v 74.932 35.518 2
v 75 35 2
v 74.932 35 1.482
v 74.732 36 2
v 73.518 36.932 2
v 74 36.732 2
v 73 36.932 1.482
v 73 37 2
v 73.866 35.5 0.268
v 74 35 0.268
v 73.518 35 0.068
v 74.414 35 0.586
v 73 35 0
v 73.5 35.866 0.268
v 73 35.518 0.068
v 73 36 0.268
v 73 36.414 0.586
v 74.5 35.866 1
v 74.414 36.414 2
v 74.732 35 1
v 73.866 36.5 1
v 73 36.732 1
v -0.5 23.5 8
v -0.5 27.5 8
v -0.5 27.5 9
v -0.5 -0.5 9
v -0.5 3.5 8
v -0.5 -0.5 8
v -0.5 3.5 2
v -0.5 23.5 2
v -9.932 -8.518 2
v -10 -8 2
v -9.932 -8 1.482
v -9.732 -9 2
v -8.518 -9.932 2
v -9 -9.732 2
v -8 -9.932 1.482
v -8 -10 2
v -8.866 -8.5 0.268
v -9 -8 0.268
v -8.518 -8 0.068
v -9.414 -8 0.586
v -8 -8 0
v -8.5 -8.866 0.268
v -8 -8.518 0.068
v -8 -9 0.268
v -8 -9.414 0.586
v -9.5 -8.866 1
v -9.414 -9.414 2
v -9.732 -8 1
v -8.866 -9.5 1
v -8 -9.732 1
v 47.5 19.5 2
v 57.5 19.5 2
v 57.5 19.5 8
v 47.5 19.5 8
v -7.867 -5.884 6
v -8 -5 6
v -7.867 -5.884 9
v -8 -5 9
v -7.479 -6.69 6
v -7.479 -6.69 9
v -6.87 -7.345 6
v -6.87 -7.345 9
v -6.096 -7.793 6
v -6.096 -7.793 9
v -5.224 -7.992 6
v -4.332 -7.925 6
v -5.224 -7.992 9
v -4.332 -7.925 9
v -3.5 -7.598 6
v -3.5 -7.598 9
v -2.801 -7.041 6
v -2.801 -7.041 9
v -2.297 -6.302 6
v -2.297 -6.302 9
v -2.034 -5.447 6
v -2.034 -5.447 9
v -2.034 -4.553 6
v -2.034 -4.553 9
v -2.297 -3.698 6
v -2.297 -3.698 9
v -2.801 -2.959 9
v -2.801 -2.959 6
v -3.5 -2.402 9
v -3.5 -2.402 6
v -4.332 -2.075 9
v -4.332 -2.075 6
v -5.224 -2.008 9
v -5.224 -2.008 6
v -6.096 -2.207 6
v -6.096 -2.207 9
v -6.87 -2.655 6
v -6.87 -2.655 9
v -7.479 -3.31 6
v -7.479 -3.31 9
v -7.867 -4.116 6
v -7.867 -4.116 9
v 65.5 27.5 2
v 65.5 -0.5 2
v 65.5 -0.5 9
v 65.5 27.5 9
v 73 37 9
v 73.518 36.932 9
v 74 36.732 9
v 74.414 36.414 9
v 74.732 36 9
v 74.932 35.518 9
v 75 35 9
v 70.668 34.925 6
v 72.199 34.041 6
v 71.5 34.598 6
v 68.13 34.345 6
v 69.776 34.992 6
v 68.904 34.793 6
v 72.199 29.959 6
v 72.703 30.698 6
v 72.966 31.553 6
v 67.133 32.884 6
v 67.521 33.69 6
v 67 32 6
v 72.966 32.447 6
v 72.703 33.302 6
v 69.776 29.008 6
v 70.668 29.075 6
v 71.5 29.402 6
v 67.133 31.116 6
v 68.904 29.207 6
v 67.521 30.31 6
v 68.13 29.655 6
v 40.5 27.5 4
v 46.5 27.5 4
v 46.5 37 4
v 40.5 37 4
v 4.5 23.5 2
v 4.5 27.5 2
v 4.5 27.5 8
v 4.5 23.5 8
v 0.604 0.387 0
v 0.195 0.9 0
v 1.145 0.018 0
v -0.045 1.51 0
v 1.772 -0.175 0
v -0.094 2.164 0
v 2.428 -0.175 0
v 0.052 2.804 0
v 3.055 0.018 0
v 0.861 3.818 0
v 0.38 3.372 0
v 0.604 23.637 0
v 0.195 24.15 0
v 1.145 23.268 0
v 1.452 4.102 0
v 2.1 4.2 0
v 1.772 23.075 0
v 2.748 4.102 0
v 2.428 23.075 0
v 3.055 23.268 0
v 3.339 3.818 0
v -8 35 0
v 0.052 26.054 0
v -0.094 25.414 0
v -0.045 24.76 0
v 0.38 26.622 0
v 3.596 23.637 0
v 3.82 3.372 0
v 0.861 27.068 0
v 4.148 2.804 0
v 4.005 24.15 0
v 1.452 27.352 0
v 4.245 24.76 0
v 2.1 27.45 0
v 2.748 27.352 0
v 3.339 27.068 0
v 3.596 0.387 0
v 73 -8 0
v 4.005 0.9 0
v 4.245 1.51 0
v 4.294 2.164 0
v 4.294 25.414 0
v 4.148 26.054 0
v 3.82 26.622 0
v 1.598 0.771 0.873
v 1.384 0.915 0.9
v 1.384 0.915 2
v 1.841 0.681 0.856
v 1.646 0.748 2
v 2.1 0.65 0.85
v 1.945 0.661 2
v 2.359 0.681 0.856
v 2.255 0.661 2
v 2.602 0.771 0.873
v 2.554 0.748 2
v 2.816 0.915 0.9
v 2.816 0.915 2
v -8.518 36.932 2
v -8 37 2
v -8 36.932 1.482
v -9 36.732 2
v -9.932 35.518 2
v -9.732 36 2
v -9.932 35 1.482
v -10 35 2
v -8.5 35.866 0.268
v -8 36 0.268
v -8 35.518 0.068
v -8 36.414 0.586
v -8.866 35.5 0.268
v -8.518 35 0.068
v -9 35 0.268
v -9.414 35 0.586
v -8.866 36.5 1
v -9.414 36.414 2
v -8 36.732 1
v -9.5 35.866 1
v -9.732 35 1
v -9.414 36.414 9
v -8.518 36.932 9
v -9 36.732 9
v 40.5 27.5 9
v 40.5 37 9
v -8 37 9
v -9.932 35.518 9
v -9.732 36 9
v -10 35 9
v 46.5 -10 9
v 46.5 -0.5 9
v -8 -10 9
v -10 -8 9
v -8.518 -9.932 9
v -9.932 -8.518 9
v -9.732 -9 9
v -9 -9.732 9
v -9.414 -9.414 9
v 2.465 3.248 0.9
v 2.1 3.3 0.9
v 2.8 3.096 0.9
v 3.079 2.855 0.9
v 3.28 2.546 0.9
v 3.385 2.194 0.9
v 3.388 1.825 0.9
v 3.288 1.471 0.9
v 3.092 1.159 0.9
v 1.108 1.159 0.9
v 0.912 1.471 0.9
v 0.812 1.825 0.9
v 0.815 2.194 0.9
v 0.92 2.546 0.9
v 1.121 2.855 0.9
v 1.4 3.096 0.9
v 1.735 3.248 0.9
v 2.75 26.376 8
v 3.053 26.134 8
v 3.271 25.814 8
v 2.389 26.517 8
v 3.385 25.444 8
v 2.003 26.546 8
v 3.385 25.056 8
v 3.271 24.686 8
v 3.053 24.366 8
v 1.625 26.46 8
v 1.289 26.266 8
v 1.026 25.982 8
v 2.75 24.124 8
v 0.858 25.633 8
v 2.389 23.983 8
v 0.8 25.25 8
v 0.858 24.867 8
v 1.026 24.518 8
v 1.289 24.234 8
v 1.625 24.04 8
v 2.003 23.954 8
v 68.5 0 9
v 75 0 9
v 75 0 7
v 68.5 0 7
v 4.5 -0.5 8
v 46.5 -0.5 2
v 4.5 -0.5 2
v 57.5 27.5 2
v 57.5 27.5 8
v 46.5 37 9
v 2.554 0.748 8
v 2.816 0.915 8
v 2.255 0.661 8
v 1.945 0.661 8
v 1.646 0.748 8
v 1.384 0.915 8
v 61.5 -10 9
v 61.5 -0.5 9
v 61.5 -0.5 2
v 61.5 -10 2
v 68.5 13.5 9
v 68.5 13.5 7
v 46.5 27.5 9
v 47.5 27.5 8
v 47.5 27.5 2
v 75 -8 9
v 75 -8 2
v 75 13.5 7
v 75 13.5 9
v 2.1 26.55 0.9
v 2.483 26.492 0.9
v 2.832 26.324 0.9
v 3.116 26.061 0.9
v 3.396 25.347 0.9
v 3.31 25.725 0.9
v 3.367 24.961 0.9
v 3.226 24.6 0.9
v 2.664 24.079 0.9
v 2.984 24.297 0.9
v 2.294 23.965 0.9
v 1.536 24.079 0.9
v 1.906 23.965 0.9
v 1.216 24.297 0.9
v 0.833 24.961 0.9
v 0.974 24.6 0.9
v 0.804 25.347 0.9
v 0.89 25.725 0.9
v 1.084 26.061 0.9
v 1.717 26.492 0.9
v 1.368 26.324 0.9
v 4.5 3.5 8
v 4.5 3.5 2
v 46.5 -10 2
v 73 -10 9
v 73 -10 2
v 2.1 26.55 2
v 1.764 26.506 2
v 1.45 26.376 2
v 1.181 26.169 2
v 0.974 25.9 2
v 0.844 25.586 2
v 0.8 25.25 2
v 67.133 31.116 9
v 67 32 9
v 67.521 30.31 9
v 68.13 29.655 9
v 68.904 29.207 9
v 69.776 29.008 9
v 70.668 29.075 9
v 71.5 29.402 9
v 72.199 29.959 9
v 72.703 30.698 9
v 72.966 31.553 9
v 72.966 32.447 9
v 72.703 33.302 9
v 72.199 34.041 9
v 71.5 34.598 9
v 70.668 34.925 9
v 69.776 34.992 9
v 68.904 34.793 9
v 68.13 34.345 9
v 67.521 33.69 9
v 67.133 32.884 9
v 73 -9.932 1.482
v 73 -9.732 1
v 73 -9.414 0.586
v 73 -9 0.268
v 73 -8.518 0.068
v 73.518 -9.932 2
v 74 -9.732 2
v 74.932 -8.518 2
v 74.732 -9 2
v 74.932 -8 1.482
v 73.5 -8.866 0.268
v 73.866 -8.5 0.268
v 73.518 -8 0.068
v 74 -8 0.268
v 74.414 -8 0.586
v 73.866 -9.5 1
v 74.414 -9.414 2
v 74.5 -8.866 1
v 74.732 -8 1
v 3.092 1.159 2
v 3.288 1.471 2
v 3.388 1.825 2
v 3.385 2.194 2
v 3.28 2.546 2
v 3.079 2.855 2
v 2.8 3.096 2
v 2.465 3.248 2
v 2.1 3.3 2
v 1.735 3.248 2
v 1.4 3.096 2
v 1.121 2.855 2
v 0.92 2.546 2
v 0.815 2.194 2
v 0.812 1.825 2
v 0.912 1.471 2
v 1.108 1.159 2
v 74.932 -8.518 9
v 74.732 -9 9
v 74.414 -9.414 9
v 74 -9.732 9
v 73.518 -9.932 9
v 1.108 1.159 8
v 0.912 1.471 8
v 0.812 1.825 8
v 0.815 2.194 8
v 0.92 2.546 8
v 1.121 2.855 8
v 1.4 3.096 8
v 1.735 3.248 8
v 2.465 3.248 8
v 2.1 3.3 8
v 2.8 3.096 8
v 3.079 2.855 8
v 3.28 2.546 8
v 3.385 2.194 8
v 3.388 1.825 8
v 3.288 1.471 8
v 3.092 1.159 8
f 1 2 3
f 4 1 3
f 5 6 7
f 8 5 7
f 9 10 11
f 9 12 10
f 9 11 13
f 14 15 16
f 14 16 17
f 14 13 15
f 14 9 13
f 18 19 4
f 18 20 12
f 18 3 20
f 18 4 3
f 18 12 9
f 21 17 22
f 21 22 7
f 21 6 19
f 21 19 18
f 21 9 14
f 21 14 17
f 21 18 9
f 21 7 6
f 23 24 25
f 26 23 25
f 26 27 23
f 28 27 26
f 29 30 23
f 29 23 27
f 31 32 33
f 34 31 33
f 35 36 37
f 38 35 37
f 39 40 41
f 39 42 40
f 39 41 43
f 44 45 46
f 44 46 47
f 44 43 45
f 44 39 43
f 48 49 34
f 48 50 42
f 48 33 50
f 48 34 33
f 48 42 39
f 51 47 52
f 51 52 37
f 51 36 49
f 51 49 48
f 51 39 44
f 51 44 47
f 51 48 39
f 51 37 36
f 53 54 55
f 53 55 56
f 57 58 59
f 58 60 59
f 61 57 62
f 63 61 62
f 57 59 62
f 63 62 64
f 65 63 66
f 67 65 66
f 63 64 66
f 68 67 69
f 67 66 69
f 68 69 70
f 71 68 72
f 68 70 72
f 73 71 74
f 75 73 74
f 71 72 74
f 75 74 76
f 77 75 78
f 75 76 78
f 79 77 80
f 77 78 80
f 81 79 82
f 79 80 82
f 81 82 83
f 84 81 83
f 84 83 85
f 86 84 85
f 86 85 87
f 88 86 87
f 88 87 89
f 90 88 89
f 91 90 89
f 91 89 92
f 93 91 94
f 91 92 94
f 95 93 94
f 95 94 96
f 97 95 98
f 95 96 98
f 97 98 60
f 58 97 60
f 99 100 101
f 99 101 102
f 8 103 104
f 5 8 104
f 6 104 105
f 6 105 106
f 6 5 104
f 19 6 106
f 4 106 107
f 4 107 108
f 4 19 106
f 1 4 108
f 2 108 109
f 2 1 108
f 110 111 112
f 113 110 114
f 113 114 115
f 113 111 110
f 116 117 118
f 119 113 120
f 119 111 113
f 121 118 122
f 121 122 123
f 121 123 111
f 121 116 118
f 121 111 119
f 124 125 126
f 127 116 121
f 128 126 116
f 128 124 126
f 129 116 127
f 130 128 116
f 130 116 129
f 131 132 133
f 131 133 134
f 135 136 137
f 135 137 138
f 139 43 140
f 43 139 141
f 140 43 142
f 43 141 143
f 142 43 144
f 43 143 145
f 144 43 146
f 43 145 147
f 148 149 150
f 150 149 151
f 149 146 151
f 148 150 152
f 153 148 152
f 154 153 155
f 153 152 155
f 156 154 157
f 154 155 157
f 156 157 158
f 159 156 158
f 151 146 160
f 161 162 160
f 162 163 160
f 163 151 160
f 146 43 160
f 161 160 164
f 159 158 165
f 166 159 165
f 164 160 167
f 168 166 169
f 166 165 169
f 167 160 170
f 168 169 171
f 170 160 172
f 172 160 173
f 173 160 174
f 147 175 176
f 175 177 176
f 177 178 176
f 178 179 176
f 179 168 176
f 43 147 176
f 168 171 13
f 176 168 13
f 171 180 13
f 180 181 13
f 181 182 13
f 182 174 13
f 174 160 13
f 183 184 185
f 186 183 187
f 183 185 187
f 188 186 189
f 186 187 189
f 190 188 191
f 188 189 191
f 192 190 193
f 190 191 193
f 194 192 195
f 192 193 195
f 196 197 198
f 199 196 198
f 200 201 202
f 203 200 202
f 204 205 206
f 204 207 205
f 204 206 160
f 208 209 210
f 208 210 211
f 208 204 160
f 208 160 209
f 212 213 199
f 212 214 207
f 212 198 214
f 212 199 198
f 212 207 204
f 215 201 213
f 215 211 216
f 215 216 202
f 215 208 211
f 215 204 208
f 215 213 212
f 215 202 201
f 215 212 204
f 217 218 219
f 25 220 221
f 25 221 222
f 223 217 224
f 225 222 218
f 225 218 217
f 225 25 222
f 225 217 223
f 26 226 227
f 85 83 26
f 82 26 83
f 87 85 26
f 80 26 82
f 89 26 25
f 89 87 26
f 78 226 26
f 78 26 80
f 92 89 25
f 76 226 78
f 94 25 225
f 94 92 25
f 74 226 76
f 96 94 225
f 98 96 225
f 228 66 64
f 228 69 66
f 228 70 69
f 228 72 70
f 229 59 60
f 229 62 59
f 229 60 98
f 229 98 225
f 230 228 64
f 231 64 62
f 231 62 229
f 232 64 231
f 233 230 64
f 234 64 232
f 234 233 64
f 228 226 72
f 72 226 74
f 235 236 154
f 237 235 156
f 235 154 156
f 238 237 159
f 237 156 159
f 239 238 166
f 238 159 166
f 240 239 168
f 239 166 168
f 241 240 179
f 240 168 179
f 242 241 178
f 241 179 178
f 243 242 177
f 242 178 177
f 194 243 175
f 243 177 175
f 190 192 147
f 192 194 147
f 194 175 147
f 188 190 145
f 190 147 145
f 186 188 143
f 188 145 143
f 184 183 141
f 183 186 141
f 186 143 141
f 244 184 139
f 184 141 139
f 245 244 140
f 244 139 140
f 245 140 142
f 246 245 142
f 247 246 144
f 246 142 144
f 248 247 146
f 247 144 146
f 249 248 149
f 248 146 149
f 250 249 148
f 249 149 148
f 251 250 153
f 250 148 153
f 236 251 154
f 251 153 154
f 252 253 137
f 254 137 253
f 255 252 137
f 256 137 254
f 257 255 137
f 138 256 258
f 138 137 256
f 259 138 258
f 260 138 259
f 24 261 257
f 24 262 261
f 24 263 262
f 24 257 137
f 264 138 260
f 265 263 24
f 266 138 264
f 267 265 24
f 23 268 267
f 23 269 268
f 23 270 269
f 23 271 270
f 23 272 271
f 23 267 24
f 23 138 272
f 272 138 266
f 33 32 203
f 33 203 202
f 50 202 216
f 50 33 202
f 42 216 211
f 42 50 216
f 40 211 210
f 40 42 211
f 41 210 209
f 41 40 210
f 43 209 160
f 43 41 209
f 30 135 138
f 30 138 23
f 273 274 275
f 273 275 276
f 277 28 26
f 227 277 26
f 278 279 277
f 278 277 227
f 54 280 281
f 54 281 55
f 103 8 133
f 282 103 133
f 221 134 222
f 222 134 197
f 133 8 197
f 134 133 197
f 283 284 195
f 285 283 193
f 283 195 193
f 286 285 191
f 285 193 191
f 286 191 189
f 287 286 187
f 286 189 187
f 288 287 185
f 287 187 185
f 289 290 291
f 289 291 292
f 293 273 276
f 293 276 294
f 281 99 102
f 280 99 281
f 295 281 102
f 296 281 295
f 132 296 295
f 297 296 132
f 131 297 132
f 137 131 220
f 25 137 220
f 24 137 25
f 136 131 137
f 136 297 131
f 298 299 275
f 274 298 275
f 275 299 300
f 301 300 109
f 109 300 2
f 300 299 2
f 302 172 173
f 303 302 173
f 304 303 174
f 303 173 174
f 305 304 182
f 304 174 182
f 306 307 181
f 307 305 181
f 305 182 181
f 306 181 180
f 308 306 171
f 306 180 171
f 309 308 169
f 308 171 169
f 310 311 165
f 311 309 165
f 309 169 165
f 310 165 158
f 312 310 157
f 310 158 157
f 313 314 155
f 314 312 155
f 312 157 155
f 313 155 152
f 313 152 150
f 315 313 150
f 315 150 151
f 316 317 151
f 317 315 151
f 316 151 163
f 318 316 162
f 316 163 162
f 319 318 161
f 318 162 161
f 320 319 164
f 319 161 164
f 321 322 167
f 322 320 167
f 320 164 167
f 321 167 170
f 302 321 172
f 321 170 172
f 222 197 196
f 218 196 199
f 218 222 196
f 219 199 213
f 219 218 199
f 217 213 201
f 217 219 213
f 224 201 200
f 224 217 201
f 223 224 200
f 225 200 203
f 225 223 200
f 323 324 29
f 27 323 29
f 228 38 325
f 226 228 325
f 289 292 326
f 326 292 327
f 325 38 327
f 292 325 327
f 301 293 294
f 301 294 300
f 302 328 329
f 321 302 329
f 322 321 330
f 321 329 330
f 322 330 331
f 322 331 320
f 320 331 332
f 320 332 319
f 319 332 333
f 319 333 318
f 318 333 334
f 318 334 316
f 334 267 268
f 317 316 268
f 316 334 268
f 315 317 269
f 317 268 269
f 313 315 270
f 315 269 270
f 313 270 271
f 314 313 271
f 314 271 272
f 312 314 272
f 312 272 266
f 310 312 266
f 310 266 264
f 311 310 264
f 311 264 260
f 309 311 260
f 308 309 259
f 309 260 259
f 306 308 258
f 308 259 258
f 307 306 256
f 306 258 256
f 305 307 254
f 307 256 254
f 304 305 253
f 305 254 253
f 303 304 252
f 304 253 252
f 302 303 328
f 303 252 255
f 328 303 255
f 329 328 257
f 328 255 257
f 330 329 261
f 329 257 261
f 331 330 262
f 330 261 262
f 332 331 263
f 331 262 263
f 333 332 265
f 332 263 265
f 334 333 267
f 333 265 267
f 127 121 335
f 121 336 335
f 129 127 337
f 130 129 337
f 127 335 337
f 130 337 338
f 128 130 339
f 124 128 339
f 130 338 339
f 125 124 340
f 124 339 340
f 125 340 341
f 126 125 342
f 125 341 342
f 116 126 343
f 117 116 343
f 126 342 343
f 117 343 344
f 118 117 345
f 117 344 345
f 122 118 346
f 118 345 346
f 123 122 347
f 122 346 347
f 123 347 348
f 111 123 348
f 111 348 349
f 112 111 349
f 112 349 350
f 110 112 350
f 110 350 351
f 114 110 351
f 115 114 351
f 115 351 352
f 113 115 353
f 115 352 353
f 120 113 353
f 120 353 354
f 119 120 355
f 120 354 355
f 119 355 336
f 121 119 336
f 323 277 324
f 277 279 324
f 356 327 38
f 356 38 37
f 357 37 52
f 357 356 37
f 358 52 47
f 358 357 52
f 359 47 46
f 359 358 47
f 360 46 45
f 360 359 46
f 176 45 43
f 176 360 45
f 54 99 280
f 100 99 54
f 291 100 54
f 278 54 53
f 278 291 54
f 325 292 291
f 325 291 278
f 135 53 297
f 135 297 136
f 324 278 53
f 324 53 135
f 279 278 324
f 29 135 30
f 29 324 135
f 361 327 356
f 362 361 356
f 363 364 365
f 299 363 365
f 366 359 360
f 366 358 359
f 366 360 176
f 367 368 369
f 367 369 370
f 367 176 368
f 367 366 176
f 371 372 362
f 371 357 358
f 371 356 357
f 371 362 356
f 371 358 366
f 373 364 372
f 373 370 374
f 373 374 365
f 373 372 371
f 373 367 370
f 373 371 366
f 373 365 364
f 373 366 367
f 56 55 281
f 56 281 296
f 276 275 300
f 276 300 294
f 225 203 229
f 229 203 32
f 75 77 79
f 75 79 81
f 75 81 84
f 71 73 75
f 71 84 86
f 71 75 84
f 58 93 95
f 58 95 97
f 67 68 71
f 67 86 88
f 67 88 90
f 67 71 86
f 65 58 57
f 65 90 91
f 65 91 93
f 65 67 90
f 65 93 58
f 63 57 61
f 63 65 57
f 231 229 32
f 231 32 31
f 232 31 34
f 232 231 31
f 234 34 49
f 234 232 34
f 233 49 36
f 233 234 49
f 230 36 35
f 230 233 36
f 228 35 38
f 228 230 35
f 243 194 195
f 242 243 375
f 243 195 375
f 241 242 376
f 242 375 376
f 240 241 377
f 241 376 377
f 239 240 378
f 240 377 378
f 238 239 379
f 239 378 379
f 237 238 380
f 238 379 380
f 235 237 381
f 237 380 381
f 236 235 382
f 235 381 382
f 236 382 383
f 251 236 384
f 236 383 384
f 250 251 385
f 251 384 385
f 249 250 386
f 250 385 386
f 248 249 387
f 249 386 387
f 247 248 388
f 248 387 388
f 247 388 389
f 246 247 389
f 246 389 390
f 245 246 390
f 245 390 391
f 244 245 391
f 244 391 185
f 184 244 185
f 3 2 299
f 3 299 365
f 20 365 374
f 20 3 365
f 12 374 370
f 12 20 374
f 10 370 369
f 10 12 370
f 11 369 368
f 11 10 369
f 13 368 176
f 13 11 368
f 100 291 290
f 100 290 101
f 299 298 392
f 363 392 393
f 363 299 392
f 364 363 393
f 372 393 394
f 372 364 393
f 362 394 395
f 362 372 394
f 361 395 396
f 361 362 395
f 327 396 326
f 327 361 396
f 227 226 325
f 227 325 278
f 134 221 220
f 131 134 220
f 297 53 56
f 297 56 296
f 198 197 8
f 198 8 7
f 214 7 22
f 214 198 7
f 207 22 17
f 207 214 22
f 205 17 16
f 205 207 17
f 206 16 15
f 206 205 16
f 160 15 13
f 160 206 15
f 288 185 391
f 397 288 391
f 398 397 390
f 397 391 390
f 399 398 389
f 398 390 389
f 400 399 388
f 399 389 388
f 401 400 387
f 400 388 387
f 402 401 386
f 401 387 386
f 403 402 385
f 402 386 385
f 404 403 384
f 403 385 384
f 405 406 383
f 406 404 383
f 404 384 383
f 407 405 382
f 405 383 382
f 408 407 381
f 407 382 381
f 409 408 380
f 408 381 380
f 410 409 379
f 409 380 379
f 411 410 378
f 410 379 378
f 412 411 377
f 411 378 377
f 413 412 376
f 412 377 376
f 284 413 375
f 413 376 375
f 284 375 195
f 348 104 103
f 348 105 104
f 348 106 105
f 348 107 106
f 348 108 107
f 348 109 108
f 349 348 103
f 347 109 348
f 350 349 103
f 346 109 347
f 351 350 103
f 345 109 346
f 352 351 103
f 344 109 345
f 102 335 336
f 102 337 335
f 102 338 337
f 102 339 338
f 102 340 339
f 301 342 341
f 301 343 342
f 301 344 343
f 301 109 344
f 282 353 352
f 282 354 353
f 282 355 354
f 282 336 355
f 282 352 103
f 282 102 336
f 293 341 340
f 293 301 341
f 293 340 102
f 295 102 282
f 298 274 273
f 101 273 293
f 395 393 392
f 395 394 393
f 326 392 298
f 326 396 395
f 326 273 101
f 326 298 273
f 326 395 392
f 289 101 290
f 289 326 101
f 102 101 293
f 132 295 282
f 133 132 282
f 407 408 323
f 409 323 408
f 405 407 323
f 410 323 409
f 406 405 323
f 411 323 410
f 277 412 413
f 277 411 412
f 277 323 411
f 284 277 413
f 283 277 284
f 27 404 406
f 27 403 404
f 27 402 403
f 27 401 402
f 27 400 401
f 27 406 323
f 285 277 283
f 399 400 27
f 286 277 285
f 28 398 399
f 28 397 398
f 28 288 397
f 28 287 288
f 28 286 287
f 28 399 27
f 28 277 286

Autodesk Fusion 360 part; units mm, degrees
sketch "Sketch1" plane through (0, 0, 0) normal (0, 0, 1) x (1, 0, 0)
  line L0 (0, 0) -> (65, 0)
  line L1 (65, 0) -> (65, 27)
  line L2 (65, 27) -> (0, 27)
  line L3 (0, 27) -> (0, 0)
  line L4 (-10, -10) -> (75, -10)
  line L5 (75, -10) -> (75, 37)
  line L6 (75, 37) -> (-10, 37)
  line L7 (-10, 37) -> (-10, -10)
  dimension "d3" = 65
  dimension "d4" = 27
  dimension "d5" = 85
  dimension "d6" = 47
  dimension "d7" = 10
  dimension "d8" = 10
extrude "Extrude1" add sketch "Sketch1" along normal blind 2 contours L0 L1 L2 L3 | L4 L5 L6 L7
sketch "Sketch2" plane through (0, 0, 2) normal (0, 0, 1) x (-1, 0, 0)
  line L0 (10, -37) -> (10, 10)
  line L1 (10, 10) -> (-75, 10)
  line L2 (-75, 10) -> (-75, -37)
  line L3 (-75, -37) -> (10, -37)
  line L4 (-65.5, -27.5) -> (0.5, -27.5)
  line L5 (0.5, -27.5) -> (0.5, 0.5)
  line L6 (0.5, 0.5) -> (-65.5, 0.5)
  line L7 (-65.5, 0.5) -> (-65.5, -27.5)
  dimension "d19" = 66
  dimension "d20" = 28
  dimension "d21" = 9.5
  dimension "d22" = 9.5
extrude "Extrude3" add sketch "Sketch2" along normal blind 7
sketch "Sketch3" plane through (0, 0, 2) normal (0, 0, 1) x (-1, 0, 0)
  circle A0 centre (-2.1, -25.25) radius 1.1
  line L0 (0.5, -27.5) -> (0.5, 0.5)
  line L1 (-65.5, -27.5) -> (0.5, -27.5)
  circle A1 centre (-2.1, -1.75) radius 1.1
  line L2 (0.5, 0.5) -> (-65.5, 0.5)
  dimension "d25" = 2.2
  dimension "d26" = 2.6
  dimension "d27" = 2.25
  dimension "d28" = 2.2
  dimension "d29" = 2.25
  dimension "d30" = 2.6
extrude "Extrude4" cut sketch "Sketch3" against normal blind 3
sketch "Sketch4" plane through (0, 0, 9) normal (0, 0, 1) x (-1, 0, 0)
  line L0 (-65.5, -27.5) -> (-65.5, 0.5)
  line L1 (-65.5, 0.5) -> (0.5, 0.5)
  line L2 (0.5, 0.5) -> (0.5, -27.5)
  line L3 (0.5, -27.5) -> (-65.5, -27.5)
  line L4 (-75, -37) -> (10, -37)
  line L5 (10, -37) -> (10, 10)
  line L6 (10, 10) -> (-75, 10)
  line L7 (-75, 10) -> (-75, -37)
  line L8 (-46.5, -37) -> (-40.5, -37)
  line L9 (-40.5, -37) -> (-40.5, -27.5)
  line L10 (-40.5, -27.5) -> (-46.5, -27.5)
  line L11 (-46.5, -27.5) -> (-46.5, -37)
  line L12 (0.5, -27.5) -> (0.5, 0.5)
  line L13 (-65.5, 0.5) -> (-65.5, -27.5)
  dimension "d34" = 41
  dimension "d35" = 19
extrude "Extrude5" cut sketch "Sketch4" against normal blind 5 contours L3 L4 L8 L9 L10 L11
sketch "Sketch7" plane through (0, 0, 9) normal (0, 0, 1) x (-1, 0, 0)
  line L0 (-46.5, -37) -> (-46.5, -27.5)
  line L1 (-46.5, -27.5) -> (-65.5, -27.5)
  line L2 (-65.5, -27.5) -> (-65.5, 0.5)
  line L3 (-65.5, 0.5) -> (0.5, 0.5)
  line L4 (0.5, 0.5) -> (0.5, -27.5)
  line L5 (0.5, -27.5) -> (-40.5, -27.5)
  line L6 (-40.5, -27.5) -> (-40.5, -37)
  line L7 (-40.5, -37) -> (10, -37)
  line L8 (10, -37) -> (10, 10)
  line L9 (10, 10) -> (-75, 10)
  line L10 (-75, 10) -> (-75, -37)
  line L11 (-75, -37) -> (-46.5, -37)
  circle A0 centre (5, 5) radius 3
  circle A1 centre (-70, -32) radius 3
  dimension "d52" = 6
  dimension "d53" = 5
  dimension "d54" = 5
  dimension "d55" = 6
  dimension "d56" = 5
  dimension "d57" = 5
extrude "Extrude7" cut sketch "Sketch7" against normal blind 3 contours A0 | A1
sketch "Sketch8" plane through (0, 0, 9) normal (0, 0, 1) x (-1, 0, 0)
  circle A0 centre (5, 5) radius 3
  circle A1 centre (-70, -32) radius 3
  line L0 (-46.5, -37) -> (-46.5, -27.5)
  line L1 (-46.5, -27.5) -> (-65.5, -27.5)
  line L2 (-65.5, -27.5) -> (-65.5, 0.5)
  line L3 (-65.5, 0.5) -> (0.5, 0.5)
  line L4 (0.5, 0.5) -> (0.5, -27.5)
  line L5 (0.5, -27.5) -> (-40.5, -27.5)
  line L6 (-40.5, -27.5) -> (-40.5, -37)
  line L7 (-40.5, -37) -> (10, -37)
  line L8 (10, -37) -> (10, 10)
  line L9 (10, 10) -> (-75, 10)
  line L10 (-75, 10) -> (-75, -37)
  line L11 (-75, -37) -> (-46.5, -37)
  line L12 (-46.5, 0.5) -> (-61.5, 0.5)
  line L13 (-61.5, 0.5) -> (-61.5, 10)
  line L14 (-61.5, 10) -> (-46.5, 10)
  line L15 (-46.5, 10) -> (-46.5, 0.5)
  line L16 (0.5, -27.5) -> (0.5, 0.5)
  line L17 (-65.5, 0.5) -> (-65.5, -27.5)
  dimension "d61" = 47
  dimension "d62" = 4
extrude "Extrude8" cut sketch "Sketch8" against normal blind 7 contours L3 L9 L12 L13 L14 L15
fillet "Fillet1" radius 2 4 edges at (-10, -10, 4.5) (75, -10, 4.5) (75, 37, 4.5) (-10, 37, 4.5)
sketch "Sketch9" plane through (0, 0, 9) normal (0, 0, 1) x (-1, 0, 0)
  arc A0 (-75, -35) -> (-73, -37) centre (-73, -35) ccw
  line L0 (-73, -37) -> (-46.5, -37)
  line L1 (-46.5, -37) -> (-46.5, -27.5)
  line L2 (-46.5, -27.5) -> (-65.5, -27.5)
  line L3 (-65.5, -27.5) -> (-65.5, 0.5)
  line L4 (-65.5, 0.5) -> (-61.5, 0.5)
  line L5 (-61.5, 0.5) -> (-61.5, 10)
  line L6 (-61.5, 10) -> (-73, 10)
  arc A1 (-73, 10) -> (-75, 8) centre (-73, 8) ccw
  line L7 (-75, 8) -> (-75, -35)
  circle A2 centre (-70, -32) radius 3
  line L8 (-75, 0) -> (-68.5, 0)
  line L9 (-68.5, 0) -> (-68.5, -13.5)
  line L10 (-68.5, -13.5) -> (-75, -13.5)
  line L11 (-75, -13.5) -> (-75, 0)
  line L12 (-65.5, 0.5) -> (-65.5, -27.5)
  dimension "d67" = 10
  dimension "d68" = 3
  dimension "d69" = 13.5
extrude "Extrude9" cut sketch "Sketch9" against normal blind 2 contours L7 L8 L9 L10 L11
sketch "Sketch10" plane through (0, 0, 0) normal (0, 0, -1) x (1, 0, 0)
  arc A0 (-10, -35) -> (-8, -37) centre (-8, -35) ccw
  line L0 (-8, -37) -> (73, -37)
  arc A1 (73, -37) -> (75, -35) centre (73, -35) ccw
  line L1 (75, -35) -> (75, 8)
  arc A2 (75, 8) -> (73, 10) centre (73, 8) ccw
  line L2 (73, 10) -> (-8, 10)
  arc A3 (-8, 10) -> (-10, 8) centre (-8, 8) ccw
  line L3 (-10, 8) -> (-10, -35)
  circle A4 centre (2.1, -25.25) radius 1.1
  circle A5 centre (2.1, -1.75) radius 1.1
  line L4 (-0.5, 0.5) -> (65.5, 0.5)
  line L5 (-0.5, -27.5) -> (-0.5, 0.5)
  circle A6 centre (2.1, -25.25) radius 1.1
  circle A7 centre (2.1, -1.75) radius 1.1
  dimension "d75" = 2.2
hole "Hole1" at (2.1, 2, 0) at (2.1, 25.25, 0) direction (0, 0, 1) diameter 2.6 depth 14 tip angle 180 countersink diameter 4.4 countersink angle 90
sketch "Sketch11" plane through (0, 0, 2) normal (0, 0, 1) x (-1, 0, 0)
  line L0 (-65.5, -27.5) -> (0.5, -27.5)
  line L1 (0.5, -27.5) -> (0.5, 0.5)
  line L2 (0.5, 0.5) -> (-46.5, 0.5)
  line L3 (-46.5, 0.5) -> (-46.5, 10)
  line L4 (-46.5, 10) -> (-61.5, 10)
  line L5 (-61.5, 10) -> (-61.5, 0.5)
  line L6 (-61.5, 0.5) -> (-65.5, 0.5)
  line L7 (-65.5, 0.5) -> (-65.5, -27.5)
  arc A0 (-2.8161, -0.915) -> (-1.3839, -0.915) centre (-2.1, -2) ccw
  arc A1 (-1.3839, -0.915) -> (-2.8161, -0.915) centre (-2.1, -1.75) ccw
  circle A2 centre (-2.1, -25.25) radius 1.3
  line L8 (0.5, -27.5) -> (-4.5, -27.5)
  line L9 (-4.5, -27.5) -> (-4.5, -23.5)
  line L10 (-4.5, -23.5) -> (0.5, -23.5)
  line L11 (0.5, -23.5) -> (0.5, -27.5)
  line L12 (0.5, 0.5) -> (-4.5, 0.5)
  line L13 (-4.5, 0.5) -> (-4.5, -3.5)
  line L14 (-4.5, -3.5) -> (0.5, -3.5)
  line L15 (0.5, -3.5) -> (0.5, 0.5)
  dimension "d81" = 5
  dimension "d82" = 4
  dimension "d83" = 5
  dimension "d84" = 4
extrude "Extrude10" add sketch "Sketch11" along normal blind 6 contours L0 L1 L8 L9 L10 L11 | L1 L2 L12 L13 L14 L15
sketch "Sketch12" plane through (0, 0, 2) normal (0, 0, 1) x (-1, 0, 0)
  line L0 (-4.5, -27.5) -> (-4.5, -23.5)
  line L1 (-4.5, -23.5) -> (0.5, -23.5)
  line L2 (0.5, -23.5) -> (0.5, -3.5)
  line L3 (0.5, -3.5) -> (-4.5, -3.5)
  line L4 (-4.5, -3.5) -> (-4.5, 0.5)
  line L5 (-4.5, 0.5) -> (-46.5, 0.5)
  line L6 (-46.5, 0.5) -> (-46.5, 10)
  line L7 (-46.5, 10) -> (-61.5, 10)
  line L8 (-61.5, 10) -> (-61.5, 0.5)
  line L9 (-61.5, 0.5) -> (-65.5, 0.5)
  line L10 (-65.5, 0.5) -> (-65.5, -27.5)
  line L11 (-65.5, -27.5) -> (-4.5, -27.5)
  line L12 (-47.5, -27.5) -> (-57.5, -27.5)
  line L13 (-57.5, -27.5) -> (-57.5, -19.5)
  line L14 (-57.5, -19.5) -> (-47.5, -19.5)
  line L15 (-47.5, -19.5) -> (-47.5, -27.5)
  dimension "d87" = 10
  dimension "d88" = 8
  dimension "d89" = 18
extrude "Extrude11" add sketch "Sketch12" along normal blind 6 contours L11 L12 L13 L14 L15
fillet "Fillet2" radius 2 8 edges at (75, 13.5, 0) (74.4142, 36.4142, 0) (32.5, 37, 0) (-9.4142, 36.4142, 0) (-10, 13.5, 0) (-9.4142, -9.4142, 0) (32.5, -10, 0) (74.4142, -9.4142, 0)
